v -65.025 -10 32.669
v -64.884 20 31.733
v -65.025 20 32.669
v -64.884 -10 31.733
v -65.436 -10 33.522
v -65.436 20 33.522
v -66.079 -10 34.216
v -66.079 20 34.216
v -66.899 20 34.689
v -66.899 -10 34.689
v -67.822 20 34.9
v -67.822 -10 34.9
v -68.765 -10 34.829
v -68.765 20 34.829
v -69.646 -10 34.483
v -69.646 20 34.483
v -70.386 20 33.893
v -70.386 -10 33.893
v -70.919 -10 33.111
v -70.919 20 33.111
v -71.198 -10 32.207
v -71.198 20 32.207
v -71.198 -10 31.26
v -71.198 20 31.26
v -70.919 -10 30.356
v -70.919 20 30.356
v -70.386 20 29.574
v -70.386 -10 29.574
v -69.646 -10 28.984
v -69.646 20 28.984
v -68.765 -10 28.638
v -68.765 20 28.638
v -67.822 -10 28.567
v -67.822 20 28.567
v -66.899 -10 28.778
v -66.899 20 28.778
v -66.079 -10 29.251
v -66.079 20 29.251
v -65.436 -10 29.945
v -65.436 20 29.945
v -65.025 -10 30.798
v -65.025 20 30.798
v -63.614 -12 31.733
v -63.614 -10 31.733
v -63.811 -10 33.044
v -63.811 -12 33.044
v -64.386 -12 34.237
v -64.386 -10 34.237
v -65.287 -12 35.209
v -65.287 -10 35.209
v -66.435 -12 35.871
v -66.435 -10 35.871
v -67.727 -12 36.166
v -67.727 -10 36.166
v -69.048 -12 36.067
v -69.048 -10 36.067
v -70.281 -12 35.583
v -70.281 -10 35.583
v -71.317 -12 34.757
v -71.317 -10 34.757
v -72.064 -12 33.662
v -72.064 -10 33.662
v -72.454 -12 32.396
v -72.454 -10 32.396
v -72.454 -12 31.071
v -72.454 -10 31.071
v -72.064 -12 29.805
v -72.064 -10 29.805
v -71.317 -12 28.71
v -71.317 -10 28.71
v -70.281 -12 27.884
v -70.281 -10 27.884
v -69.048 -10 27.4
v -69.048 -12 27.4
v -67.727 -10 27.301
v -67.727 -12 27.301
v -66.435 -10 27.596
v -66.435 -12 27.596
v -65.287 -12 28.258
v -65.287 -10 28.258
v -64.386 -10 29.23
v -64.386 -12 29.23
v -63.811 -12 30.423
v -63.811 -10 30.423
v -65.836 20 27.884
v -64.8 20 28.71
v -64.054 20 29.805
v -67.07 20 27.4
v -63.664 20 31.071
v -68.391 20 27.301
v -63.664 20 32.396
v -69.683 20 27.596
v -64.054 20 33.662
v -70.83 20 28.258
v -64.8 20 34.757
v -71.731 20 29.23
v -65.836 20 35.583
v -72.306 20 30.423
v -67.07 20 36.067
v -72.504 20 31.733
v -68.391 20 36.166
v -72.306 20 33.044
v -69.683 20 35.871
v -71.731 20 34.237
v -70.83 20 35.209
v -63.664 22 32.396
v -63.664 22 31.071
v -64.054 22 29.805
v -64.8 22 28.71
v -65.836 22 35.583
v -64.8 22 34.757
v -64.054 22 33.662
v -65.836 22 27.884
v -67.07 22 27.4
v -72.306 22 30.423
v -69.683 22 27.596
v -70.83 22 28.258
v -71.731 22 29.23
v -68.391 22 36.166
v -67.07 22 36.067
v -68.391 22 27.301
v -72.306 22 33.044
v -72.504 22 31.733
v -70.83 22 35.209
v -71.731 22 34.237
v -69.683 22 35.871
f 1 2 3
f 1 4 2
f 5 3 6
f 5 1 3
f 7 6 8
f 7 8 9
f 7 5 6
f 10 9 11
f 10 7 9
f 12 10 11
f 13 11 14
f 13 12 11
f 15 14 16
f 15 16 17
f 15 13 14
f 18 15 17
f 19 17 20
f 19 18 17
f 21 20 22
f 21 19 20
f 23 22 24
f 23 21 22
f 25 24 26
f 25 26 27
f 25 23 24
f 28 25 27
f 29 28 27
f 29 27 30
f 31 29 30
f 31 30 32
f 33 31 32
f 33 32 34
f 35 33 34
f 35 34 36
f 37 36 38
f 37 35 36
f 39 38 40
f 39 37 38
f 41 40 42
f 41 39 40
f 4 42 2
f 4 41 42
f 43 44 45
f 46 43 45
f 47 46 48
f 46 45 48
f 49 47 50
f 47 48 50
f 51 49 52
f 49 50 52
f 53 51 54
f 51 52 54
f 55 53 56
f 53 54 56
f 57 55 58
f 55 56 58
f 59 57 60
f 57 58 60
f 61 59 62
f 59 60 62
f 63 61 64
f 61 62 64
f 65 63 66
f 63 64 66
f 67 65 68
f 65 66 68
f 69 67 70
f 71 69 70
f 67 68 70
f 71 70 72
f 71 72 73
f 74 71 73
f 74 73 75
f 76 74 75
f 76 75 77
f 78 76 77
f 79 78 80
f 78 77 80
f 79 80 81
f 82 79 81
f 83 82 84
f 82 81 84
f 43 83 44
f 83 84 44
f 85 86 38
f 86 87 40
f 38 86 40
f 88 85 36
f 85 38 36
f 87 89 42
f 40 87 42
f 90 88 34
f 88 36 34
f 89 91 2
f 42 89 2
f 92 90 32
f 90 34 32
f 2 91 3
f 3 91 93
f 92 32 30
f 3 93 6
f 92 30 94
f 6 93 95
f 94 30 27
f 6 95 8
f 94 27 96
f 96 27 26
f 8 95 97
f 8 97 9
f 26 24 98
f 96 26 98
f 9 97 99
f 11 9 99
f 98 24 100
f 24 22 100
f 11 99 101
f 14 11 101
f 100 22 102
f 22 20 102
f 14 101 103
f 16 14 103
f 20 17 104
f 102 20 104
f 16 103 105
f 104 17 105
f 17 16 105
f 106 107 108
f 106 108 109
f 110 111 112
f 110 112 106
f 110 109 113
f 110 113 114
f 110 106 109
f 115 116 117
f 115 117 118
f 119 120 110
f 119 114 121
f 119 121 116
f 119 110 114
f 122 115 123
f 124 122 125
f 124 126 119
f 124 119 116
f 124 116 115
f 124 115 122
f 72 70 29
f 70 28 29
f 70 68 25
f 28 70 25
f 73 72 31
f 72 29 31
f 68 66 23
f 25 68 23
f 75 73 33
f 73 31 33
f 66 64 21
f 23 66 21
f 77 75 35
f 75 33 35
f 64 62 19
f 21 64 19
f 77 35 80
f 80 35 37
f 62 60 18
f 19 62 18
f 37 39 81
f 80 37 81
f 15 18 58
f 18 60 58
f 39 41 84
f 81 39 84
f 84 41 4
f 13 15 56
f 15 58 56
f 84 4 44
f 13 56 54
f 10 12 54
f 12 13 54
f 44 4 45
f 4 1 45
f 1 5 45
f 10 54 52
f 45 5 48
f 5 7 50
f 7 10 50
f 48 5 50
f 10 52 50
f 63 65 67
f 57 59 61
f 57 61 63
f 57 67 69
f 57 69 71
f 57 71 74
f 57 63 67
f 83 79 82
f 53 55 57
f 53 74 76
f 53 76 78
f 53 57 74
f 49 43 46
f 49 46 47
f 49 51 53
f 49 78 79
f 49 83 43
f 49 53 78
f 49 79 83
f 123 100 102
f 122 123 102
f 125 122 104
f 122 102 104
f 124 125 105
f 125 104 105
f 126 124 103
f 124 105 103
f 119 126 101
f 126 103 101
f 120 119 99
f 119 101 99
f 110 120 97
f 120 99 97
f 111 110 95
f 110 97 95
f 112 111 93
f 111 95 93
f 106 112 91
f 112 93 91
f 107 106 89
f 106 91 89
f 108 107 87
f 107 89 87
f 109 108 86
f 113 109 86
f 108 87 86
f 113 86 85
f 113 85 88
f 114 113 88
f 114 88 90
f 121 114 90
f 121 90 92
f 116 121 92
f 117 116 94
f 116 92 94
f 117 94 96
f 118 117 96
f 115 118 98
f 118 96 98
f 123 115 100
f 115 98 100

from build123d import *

# Parameters (mm, degrees)
F0_R      = 3.175
F1_DEPTH  = 10
F1_FACE_R = 3.175
F2_R      = 4.445
F3_DEPTH  = 2
F4_DEPTH  = 20
F5_R      = 4.445
F6_DEPTH  = 2


with BuildPart() as f1:
    # F0 (on Front) → F1 (new body)
    with BuildSketch(Plane.XZ):
        with Locations((-68.0588558316, 31.7334979773)):
            Circle(F0_R)
    extrude(amount=F1_DEPTH)

    # F1_face (on face) + F2 (on face) → F3 (join)
    with BuildSketch(Plane(origin=(-68.0588558316, -10, 31.7334979773), x_dir=(1, 0, 0), z_dir=(0, -1, 0))):
        Circle(F1_FACE_R)
    with BuildSketch(Plane.XZ.offset(10)):
        with Locations((-68.0588558316, 31.7334979773)):
            Circle(F2_R)
    extrude(amount=F3_DEPTH)

    # F4 (add): a face of the model
    f4_faces = [f1.faces().sort_by_distance(p)[0] for p in [
        (-68.0588558316, 0, 31.7334979773),
    ]]
    extrude(f4_faces, amount=F4_DEPTH)

    # F5 (on face) → F6 (join)
    with BuildSketch(Plane(origin=(0, 20, 0), x_dir=(-1, 0, 0), z_dir=(0, 1, 0))):
        with Locations((68.0588558316, 31.7334979773)):
            Circle(F5_R)
    extrude(amount=F6_DEPTH)


solid = f1.part
